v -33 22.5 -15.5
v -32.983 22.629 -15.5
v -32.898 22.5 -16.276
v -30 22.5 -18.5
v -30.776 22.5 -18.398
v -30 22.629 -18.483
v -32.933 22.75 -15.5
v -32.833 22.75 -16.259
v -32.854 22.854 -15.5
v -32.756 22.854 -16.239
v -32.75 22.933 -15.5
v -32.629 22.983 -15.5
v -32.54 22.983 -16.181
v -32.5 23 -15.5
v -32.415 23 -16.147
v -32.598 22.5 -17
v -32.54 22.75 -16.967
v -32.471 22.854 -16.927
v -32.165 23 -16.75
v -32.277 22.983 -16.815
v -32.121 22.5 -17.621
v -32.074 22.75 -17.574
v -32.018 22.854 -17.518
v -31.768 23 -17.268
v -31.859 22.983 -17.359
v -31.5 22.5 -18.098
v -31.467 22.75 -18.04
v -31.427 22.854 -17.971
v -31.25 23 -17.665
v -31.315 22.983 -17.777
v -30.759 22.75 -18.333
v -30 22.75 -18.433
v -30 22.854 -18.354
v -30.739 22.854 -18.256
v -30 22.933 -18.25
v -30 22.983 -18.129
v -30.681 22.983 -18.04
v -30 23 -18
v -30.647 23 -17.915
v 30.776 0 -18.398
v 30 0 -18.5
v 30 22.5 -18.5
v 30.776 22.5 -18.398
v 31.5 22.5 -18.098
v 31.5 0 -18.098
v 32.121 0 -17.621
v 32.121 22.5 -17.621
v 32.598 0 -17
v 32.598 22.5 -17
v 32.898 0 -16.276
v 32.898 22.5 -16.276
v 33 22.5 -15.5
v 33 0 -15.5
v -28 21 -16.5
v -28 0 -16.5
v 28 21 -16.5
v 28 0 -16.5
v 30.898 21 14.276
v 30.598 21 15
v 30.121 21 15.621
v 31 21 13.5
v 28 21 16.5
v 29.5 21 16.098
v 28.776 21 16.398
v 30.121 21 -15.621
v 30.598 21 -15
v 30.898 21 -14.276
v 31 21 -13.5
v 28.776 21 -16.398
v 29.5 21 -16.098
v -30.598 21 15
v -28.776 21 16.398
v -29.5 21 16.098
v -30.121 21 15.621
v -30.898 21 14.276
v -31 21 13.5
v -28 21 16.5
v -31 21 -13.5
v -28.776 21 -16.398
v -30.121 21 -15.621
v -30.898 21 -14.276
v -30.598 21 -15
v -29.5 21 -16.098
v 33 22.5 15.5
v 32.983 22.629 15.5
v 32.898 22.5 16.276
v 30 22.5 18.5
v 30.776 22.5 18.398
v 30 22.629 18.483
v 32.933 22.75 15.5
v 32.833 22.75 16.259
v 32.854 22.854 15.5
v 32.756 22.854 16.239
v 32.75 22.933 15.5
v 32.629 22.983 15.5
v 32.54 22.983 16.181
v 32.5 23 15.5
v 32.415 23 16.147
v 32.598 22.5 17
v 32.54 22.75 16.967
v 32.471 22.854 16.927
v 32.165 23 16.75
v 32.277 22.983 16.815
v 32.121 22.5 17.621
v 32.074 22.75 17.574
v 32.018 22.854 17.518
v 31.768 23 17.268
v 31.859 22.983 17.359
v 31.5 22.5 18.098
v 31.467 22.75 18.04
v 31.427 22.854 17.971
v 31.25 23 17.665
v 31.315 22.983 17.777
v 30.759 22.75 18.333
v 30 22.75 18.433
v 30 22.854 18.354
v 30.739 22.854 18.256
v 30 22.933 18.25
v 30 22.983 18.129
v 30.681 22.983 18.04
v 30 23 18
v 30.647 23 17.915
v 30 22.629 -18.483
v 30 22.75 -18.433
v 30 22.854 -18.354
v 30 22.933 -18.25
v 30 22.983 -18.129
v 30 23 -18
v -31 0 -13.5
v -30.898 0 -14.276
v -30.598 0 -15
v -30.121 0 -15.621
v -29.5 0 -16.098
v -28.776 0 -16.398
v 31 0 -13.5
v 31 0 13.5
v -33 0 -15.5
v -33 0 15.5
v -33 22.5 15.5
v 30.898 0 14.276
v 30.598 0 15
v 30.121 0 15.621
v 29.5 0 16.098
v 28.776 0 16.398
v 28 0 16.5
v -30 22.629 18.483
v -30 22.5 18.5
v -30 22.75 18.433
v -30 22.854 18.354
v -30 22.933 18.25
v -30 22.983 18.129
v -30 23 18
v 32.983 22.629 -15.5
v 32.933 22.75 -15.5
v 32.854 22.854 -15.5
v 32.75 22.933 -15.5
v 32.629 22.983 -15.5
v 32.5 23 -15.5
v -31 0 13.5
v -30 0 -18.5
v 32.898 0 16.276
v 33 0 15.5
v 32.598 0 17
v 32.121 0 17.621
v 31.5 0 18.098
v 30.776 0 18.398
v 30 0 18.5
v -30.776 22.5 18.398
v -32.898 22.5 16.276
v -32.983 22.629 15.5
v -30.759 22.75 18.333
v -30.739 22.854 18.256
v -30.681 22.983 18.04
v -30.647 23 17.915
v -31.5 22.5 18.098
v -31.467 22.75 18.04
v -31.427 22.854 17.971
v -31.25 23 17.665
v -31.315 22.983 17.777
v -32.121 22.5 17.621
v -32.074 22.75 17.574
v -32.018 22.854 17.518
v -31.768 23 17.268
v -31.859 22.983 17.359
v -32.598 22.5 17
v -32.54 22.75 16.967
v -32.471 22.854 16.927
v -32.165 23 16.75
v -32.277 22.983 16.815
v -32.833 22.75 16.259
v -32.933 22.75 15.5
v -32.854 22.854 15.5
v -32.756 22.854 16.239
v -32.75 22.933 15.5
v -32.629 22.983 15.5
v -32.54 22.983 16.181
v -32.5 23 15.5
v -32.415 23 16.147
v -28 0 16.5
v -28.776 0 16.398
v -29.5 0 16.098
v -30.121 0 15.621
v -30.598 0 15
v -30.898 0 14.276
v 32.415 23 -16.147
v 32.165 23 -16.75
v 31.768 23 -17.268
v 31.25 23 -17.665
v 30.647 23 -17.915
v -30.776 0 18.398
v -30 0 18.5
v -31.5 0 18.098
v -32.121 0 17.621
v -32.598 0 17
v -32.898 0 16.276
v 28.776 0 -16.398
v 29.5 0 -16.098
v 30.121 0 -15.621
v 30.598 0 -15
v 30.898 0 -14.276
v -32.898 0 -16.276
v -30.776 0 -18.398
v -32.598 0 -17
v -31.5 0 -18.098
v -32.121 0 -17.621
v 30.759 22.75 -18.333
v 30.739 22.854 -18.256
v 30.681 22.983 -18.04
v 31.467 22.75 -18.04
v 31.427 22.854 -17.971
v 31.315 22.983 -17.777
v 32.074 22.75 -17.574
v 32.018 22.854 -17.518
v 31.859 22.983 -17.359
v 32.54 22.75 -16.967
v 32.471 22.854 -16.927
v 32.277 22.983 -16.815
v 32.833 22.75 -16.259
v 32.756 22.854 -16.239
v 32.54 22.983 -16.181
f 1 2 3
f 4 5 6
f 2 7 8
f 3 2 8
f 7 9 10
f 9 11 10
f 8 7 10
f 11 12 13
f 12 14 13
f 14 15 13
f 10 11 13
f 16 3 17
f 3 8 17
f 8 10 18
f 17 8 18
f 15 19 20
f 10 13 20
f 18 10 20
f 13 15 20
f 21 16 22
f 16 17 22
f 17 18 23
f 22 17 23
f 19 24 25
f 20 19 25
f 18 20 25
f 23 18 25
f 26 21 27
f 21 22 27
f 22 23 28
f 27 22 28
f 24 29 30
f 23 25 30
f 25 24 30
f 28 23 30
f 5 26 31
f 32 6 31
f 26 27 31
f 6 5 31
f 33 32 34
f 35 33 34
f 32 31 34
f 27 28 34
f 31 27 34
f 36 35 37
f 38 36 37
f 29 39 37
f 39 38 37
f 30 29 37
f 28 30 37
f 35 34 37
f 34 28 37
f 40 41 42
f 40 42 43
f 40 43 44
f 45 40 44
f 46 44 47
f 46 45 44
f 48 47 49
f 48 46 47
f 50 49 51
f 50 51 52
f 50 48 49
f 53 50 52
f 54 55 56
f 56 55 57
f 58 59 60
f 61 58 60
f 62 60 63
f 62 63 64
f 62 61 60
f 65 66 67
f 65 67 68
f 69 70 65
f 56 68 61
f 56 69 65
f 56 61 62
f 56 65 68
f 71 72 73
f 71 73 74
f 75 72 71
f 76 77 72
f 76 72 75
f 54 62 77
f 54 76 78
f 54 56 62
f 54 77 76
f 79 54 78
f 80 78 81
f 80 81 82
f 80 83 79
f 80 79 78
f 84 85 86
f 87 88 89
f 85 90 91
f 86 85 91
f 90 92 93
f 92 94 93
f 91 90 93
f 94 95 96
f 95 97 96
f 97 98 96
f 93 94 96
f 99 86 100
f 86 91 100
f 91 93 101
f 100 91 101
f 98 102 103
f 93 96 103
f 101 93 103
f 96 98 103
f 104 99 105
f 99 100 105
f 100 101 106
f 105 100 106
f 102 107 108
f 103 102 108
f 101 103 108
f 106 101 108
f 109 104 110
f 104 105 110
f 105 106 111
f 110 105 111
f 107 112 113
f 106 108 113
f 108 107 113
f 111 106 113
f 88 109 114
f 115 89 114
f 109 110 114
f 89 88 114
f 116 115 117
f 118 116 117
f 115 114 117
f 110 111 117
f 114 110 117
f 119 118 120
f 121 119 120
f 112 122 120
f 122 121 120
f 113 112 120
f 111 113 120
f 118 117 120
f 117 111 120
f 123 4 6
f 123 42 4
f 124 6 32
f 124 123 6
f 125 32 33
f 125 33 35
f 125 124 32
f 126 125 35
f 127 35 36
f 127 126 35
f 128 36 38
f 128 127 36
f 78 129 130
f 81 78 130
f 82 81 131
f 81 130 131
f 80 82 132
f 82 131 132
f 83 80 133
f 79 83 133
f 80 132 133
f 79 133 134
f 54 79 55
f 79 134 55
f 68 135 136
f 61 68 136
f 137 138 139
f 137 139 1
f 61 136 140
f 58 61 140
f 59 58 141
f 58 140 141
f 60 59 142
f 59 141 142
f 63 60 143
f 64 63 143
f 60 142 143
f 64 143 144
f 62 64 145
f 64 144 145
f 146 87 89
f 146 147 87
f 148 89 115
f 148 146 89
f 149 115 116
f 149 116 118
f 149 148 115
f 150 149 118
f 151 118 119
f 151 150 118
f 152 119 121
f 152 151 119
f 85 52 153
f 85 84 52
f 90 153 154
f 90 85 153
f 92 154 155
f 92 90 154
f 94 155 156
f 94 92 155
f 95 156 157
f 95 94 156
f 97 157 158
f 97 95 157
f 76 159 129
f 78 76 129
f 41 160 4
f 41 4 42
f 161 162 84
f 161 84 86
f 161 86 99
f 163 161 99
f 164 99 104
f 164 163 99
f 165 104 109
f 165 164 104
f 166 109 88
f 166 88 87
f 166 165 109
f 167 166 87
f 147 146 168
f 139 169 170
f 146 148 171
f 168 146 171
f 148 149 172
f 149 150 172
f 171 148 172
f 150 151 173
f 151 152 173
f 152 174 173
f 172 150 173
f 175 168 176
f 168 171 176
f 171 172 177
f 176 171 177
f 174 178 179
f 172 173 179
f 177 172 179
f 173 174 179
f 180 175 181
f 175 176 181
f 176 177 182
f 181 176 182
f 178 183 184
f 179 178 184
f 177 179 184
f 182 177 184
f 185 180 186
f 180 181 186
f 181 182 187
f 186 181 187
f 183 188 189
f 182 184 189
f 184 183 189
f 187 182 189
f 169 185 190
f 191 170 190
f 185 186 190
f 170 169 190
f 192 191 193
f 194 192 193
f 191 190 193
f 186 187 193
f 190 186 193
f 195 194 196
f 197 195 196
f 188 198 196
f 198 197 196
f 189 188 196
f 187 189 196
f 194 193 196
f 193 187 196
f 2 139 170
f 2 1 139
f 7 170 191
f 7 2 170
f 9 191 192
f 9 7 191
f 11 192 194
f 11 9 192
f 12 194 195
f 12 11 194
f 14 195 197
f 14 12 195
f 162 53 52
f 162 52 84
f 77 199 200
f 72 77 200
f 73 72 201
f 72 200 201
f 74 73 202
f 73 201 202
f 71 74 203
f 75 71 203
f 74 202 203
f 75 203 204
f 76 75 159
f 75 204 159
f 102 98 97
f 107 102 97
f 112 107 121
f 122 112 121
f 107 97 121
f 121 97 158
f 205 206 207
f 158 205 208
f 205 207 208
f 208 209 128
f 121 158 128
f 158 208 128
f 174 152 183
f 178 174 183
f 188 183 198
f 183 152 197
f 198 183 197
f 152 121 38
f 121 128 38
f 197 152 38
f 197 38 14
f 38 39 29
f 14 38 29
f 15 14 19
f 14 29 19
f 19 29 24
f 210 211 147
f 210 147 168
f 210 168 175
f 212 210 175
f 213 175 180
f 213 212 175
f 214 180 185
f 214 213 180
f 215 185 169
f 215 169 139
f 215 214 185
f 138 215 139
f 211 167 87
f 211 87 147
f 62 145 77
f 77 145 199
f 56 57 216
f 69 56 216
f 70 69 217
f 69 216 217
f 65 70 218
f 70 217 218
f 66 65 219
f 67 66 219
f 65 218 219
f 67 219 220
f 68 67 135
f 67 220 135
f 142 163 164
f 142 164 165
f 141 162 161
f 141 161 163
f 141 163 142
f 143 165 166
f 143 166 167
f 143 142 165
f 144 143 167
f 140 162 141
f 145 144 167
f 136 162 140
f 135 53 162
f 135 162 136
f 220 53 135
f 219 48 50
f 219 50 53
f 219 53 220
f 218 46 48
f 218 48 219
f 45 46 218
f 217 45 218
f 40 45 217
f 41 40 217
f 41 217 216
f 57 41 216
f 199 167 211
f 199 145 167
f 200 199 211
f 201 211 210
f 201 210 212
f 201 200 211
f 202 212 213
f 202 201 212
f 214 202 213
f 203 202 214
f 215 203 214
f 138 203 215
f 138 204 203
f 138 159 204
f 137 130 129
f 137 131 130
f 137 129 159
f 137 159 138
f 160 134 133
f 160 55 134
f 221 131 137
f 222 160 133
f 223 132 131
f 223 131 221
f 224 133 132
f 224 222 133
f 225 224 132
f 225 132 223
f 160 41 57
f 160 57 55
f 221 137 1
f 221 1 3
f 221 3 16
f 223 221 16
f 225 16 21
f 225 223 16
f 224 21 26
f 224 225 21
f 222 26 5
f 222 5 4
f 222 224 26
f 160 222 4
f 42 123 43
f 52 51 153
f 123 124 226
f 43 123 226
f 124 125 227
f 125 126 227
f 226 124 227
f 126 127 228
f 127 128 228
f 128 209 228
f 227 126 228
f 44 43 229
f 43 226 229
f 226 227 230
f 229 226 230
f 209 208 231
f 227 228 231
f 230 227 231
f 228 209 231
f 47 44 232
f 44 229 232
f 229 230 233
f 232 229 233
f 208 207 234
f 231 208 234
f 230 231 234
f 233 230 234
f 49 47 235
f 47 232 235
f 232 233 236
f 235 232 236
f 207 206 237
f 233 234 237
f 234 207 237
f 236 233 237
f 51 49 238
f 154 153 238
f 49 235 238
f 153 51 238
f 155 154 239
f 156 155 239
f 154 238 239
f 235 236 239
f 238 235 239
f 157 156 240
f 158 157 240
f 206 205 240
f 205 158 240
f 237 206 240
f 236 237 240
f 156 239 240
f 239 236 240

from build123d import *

# Parameters (mm, degrees)
BOSS_EXTRUDE1_DEPTH = 21
BOSS_EXTRUDE2_DEPTH = 2
FILLET1_R           = 0.5


with BuildPart() as part:
    # Sketch1 → Boss-Extrude1 (new body)
    with BuildSketch(Plane(origin=(0, 0, 0), x_dir=(1, 0, 0), z_dir=(0, 1, 0))):
        with BuildLine():
            Line((-30, 18.5), (30, 18.5))
            ThreePointArc((30, 18.5), (32.121320344, 17.621320344), (33, 15.5))
            Line((33, 15.5), (33, -15.5))
            ThreePointArc((33, -15.5), (32.121320344, -17.621320344), (30, -18.5))
            Line((30, -18.5), (-30, -18.5))
            ThreePointArc((-30, -18.5), (-32.121320344, -17.621320344), (-33, -15.5))
            Line((-33, -15.5), (-33, 15.5))
            ThreePointArc((-33, 15.5), (-32.121320344, 17.621320344), (-30, 18.5))
        make_face()
        with BuildLine():
            Line((-28, 16.5), (28, 16.5))
            ThreePointArc((28, 16.5), (30.121320344, 15.621320344), (31, 13.5))
            Line((31, 13.5), (31, -13.5))
            ThreePointArc((31, -13.5), (30.121320344, -15.621320344), (28, -16.5))
            Line((28, -16.5), (-28, -16.5))
            ThreePointArc((-28, -16.5), (-30.121320344, -15.621320344), (-31, -13.5))
            Line((-31, -13.5), (-31, 13.5))
            ThreePointArc((-31, 13.5), (-30.121320344, 15.621320344), (-28, 16.5))
        make_face(mode=Mode.SUBTRACT)
    extrude(amount=BOSS_EXTRUDE1_DEPTH)

    # Sketch2 → Boss-Extrude2 (add)
    with BuildSketch(Plane(origin=(0, 21, 0), x_dir=(1, 0, 0), z_dir=(0, 1, 0))):
        with BuildLine():
            Line((-30, 18.5), (30, 18.5))
            ThreePointArc((30, 18.5), (32.121320344, 17.621320344), (33, 15.5))
            Line((33, 15.5), (33, -15.5))
            ThreePointArc((33, -15.5), (32.121320344, -17.621320344), (30, -18.5))
            Line((30, -18.5), (-30, -18.5))
            ThreePointArc((-30, -18.5), (-32.121320344, -17.621320344), (-33, -15.5))
            Line((-33, -15.5), (-33, 15.5))
            ThreePointArc((-33, 15.5), (-32.121320344, 17.621320344), (-30, 18.5))
        make_face()
    extrude(amount=BOSS_EXTRUDE2_DEPTH)

    # Fillet1
    fillet1_edges = [part.edges().sort_by_distance(p)[0] for p in [
        (-32.121320344, 23, 17.621320344),
        (0, 23, 18.5),
        (32.121320344, 23, 17.621320344),
        (33, 23, 0),
        (32.121320344, 23, -17.621320344),
        (0, 23, -18.5),
        (-32.121320344, 23, -17.621320344),
        (-33, 23, 0),
    ]]
    fillet(fillet1_edges, radius=FILLET1_R)


solid = part.part
